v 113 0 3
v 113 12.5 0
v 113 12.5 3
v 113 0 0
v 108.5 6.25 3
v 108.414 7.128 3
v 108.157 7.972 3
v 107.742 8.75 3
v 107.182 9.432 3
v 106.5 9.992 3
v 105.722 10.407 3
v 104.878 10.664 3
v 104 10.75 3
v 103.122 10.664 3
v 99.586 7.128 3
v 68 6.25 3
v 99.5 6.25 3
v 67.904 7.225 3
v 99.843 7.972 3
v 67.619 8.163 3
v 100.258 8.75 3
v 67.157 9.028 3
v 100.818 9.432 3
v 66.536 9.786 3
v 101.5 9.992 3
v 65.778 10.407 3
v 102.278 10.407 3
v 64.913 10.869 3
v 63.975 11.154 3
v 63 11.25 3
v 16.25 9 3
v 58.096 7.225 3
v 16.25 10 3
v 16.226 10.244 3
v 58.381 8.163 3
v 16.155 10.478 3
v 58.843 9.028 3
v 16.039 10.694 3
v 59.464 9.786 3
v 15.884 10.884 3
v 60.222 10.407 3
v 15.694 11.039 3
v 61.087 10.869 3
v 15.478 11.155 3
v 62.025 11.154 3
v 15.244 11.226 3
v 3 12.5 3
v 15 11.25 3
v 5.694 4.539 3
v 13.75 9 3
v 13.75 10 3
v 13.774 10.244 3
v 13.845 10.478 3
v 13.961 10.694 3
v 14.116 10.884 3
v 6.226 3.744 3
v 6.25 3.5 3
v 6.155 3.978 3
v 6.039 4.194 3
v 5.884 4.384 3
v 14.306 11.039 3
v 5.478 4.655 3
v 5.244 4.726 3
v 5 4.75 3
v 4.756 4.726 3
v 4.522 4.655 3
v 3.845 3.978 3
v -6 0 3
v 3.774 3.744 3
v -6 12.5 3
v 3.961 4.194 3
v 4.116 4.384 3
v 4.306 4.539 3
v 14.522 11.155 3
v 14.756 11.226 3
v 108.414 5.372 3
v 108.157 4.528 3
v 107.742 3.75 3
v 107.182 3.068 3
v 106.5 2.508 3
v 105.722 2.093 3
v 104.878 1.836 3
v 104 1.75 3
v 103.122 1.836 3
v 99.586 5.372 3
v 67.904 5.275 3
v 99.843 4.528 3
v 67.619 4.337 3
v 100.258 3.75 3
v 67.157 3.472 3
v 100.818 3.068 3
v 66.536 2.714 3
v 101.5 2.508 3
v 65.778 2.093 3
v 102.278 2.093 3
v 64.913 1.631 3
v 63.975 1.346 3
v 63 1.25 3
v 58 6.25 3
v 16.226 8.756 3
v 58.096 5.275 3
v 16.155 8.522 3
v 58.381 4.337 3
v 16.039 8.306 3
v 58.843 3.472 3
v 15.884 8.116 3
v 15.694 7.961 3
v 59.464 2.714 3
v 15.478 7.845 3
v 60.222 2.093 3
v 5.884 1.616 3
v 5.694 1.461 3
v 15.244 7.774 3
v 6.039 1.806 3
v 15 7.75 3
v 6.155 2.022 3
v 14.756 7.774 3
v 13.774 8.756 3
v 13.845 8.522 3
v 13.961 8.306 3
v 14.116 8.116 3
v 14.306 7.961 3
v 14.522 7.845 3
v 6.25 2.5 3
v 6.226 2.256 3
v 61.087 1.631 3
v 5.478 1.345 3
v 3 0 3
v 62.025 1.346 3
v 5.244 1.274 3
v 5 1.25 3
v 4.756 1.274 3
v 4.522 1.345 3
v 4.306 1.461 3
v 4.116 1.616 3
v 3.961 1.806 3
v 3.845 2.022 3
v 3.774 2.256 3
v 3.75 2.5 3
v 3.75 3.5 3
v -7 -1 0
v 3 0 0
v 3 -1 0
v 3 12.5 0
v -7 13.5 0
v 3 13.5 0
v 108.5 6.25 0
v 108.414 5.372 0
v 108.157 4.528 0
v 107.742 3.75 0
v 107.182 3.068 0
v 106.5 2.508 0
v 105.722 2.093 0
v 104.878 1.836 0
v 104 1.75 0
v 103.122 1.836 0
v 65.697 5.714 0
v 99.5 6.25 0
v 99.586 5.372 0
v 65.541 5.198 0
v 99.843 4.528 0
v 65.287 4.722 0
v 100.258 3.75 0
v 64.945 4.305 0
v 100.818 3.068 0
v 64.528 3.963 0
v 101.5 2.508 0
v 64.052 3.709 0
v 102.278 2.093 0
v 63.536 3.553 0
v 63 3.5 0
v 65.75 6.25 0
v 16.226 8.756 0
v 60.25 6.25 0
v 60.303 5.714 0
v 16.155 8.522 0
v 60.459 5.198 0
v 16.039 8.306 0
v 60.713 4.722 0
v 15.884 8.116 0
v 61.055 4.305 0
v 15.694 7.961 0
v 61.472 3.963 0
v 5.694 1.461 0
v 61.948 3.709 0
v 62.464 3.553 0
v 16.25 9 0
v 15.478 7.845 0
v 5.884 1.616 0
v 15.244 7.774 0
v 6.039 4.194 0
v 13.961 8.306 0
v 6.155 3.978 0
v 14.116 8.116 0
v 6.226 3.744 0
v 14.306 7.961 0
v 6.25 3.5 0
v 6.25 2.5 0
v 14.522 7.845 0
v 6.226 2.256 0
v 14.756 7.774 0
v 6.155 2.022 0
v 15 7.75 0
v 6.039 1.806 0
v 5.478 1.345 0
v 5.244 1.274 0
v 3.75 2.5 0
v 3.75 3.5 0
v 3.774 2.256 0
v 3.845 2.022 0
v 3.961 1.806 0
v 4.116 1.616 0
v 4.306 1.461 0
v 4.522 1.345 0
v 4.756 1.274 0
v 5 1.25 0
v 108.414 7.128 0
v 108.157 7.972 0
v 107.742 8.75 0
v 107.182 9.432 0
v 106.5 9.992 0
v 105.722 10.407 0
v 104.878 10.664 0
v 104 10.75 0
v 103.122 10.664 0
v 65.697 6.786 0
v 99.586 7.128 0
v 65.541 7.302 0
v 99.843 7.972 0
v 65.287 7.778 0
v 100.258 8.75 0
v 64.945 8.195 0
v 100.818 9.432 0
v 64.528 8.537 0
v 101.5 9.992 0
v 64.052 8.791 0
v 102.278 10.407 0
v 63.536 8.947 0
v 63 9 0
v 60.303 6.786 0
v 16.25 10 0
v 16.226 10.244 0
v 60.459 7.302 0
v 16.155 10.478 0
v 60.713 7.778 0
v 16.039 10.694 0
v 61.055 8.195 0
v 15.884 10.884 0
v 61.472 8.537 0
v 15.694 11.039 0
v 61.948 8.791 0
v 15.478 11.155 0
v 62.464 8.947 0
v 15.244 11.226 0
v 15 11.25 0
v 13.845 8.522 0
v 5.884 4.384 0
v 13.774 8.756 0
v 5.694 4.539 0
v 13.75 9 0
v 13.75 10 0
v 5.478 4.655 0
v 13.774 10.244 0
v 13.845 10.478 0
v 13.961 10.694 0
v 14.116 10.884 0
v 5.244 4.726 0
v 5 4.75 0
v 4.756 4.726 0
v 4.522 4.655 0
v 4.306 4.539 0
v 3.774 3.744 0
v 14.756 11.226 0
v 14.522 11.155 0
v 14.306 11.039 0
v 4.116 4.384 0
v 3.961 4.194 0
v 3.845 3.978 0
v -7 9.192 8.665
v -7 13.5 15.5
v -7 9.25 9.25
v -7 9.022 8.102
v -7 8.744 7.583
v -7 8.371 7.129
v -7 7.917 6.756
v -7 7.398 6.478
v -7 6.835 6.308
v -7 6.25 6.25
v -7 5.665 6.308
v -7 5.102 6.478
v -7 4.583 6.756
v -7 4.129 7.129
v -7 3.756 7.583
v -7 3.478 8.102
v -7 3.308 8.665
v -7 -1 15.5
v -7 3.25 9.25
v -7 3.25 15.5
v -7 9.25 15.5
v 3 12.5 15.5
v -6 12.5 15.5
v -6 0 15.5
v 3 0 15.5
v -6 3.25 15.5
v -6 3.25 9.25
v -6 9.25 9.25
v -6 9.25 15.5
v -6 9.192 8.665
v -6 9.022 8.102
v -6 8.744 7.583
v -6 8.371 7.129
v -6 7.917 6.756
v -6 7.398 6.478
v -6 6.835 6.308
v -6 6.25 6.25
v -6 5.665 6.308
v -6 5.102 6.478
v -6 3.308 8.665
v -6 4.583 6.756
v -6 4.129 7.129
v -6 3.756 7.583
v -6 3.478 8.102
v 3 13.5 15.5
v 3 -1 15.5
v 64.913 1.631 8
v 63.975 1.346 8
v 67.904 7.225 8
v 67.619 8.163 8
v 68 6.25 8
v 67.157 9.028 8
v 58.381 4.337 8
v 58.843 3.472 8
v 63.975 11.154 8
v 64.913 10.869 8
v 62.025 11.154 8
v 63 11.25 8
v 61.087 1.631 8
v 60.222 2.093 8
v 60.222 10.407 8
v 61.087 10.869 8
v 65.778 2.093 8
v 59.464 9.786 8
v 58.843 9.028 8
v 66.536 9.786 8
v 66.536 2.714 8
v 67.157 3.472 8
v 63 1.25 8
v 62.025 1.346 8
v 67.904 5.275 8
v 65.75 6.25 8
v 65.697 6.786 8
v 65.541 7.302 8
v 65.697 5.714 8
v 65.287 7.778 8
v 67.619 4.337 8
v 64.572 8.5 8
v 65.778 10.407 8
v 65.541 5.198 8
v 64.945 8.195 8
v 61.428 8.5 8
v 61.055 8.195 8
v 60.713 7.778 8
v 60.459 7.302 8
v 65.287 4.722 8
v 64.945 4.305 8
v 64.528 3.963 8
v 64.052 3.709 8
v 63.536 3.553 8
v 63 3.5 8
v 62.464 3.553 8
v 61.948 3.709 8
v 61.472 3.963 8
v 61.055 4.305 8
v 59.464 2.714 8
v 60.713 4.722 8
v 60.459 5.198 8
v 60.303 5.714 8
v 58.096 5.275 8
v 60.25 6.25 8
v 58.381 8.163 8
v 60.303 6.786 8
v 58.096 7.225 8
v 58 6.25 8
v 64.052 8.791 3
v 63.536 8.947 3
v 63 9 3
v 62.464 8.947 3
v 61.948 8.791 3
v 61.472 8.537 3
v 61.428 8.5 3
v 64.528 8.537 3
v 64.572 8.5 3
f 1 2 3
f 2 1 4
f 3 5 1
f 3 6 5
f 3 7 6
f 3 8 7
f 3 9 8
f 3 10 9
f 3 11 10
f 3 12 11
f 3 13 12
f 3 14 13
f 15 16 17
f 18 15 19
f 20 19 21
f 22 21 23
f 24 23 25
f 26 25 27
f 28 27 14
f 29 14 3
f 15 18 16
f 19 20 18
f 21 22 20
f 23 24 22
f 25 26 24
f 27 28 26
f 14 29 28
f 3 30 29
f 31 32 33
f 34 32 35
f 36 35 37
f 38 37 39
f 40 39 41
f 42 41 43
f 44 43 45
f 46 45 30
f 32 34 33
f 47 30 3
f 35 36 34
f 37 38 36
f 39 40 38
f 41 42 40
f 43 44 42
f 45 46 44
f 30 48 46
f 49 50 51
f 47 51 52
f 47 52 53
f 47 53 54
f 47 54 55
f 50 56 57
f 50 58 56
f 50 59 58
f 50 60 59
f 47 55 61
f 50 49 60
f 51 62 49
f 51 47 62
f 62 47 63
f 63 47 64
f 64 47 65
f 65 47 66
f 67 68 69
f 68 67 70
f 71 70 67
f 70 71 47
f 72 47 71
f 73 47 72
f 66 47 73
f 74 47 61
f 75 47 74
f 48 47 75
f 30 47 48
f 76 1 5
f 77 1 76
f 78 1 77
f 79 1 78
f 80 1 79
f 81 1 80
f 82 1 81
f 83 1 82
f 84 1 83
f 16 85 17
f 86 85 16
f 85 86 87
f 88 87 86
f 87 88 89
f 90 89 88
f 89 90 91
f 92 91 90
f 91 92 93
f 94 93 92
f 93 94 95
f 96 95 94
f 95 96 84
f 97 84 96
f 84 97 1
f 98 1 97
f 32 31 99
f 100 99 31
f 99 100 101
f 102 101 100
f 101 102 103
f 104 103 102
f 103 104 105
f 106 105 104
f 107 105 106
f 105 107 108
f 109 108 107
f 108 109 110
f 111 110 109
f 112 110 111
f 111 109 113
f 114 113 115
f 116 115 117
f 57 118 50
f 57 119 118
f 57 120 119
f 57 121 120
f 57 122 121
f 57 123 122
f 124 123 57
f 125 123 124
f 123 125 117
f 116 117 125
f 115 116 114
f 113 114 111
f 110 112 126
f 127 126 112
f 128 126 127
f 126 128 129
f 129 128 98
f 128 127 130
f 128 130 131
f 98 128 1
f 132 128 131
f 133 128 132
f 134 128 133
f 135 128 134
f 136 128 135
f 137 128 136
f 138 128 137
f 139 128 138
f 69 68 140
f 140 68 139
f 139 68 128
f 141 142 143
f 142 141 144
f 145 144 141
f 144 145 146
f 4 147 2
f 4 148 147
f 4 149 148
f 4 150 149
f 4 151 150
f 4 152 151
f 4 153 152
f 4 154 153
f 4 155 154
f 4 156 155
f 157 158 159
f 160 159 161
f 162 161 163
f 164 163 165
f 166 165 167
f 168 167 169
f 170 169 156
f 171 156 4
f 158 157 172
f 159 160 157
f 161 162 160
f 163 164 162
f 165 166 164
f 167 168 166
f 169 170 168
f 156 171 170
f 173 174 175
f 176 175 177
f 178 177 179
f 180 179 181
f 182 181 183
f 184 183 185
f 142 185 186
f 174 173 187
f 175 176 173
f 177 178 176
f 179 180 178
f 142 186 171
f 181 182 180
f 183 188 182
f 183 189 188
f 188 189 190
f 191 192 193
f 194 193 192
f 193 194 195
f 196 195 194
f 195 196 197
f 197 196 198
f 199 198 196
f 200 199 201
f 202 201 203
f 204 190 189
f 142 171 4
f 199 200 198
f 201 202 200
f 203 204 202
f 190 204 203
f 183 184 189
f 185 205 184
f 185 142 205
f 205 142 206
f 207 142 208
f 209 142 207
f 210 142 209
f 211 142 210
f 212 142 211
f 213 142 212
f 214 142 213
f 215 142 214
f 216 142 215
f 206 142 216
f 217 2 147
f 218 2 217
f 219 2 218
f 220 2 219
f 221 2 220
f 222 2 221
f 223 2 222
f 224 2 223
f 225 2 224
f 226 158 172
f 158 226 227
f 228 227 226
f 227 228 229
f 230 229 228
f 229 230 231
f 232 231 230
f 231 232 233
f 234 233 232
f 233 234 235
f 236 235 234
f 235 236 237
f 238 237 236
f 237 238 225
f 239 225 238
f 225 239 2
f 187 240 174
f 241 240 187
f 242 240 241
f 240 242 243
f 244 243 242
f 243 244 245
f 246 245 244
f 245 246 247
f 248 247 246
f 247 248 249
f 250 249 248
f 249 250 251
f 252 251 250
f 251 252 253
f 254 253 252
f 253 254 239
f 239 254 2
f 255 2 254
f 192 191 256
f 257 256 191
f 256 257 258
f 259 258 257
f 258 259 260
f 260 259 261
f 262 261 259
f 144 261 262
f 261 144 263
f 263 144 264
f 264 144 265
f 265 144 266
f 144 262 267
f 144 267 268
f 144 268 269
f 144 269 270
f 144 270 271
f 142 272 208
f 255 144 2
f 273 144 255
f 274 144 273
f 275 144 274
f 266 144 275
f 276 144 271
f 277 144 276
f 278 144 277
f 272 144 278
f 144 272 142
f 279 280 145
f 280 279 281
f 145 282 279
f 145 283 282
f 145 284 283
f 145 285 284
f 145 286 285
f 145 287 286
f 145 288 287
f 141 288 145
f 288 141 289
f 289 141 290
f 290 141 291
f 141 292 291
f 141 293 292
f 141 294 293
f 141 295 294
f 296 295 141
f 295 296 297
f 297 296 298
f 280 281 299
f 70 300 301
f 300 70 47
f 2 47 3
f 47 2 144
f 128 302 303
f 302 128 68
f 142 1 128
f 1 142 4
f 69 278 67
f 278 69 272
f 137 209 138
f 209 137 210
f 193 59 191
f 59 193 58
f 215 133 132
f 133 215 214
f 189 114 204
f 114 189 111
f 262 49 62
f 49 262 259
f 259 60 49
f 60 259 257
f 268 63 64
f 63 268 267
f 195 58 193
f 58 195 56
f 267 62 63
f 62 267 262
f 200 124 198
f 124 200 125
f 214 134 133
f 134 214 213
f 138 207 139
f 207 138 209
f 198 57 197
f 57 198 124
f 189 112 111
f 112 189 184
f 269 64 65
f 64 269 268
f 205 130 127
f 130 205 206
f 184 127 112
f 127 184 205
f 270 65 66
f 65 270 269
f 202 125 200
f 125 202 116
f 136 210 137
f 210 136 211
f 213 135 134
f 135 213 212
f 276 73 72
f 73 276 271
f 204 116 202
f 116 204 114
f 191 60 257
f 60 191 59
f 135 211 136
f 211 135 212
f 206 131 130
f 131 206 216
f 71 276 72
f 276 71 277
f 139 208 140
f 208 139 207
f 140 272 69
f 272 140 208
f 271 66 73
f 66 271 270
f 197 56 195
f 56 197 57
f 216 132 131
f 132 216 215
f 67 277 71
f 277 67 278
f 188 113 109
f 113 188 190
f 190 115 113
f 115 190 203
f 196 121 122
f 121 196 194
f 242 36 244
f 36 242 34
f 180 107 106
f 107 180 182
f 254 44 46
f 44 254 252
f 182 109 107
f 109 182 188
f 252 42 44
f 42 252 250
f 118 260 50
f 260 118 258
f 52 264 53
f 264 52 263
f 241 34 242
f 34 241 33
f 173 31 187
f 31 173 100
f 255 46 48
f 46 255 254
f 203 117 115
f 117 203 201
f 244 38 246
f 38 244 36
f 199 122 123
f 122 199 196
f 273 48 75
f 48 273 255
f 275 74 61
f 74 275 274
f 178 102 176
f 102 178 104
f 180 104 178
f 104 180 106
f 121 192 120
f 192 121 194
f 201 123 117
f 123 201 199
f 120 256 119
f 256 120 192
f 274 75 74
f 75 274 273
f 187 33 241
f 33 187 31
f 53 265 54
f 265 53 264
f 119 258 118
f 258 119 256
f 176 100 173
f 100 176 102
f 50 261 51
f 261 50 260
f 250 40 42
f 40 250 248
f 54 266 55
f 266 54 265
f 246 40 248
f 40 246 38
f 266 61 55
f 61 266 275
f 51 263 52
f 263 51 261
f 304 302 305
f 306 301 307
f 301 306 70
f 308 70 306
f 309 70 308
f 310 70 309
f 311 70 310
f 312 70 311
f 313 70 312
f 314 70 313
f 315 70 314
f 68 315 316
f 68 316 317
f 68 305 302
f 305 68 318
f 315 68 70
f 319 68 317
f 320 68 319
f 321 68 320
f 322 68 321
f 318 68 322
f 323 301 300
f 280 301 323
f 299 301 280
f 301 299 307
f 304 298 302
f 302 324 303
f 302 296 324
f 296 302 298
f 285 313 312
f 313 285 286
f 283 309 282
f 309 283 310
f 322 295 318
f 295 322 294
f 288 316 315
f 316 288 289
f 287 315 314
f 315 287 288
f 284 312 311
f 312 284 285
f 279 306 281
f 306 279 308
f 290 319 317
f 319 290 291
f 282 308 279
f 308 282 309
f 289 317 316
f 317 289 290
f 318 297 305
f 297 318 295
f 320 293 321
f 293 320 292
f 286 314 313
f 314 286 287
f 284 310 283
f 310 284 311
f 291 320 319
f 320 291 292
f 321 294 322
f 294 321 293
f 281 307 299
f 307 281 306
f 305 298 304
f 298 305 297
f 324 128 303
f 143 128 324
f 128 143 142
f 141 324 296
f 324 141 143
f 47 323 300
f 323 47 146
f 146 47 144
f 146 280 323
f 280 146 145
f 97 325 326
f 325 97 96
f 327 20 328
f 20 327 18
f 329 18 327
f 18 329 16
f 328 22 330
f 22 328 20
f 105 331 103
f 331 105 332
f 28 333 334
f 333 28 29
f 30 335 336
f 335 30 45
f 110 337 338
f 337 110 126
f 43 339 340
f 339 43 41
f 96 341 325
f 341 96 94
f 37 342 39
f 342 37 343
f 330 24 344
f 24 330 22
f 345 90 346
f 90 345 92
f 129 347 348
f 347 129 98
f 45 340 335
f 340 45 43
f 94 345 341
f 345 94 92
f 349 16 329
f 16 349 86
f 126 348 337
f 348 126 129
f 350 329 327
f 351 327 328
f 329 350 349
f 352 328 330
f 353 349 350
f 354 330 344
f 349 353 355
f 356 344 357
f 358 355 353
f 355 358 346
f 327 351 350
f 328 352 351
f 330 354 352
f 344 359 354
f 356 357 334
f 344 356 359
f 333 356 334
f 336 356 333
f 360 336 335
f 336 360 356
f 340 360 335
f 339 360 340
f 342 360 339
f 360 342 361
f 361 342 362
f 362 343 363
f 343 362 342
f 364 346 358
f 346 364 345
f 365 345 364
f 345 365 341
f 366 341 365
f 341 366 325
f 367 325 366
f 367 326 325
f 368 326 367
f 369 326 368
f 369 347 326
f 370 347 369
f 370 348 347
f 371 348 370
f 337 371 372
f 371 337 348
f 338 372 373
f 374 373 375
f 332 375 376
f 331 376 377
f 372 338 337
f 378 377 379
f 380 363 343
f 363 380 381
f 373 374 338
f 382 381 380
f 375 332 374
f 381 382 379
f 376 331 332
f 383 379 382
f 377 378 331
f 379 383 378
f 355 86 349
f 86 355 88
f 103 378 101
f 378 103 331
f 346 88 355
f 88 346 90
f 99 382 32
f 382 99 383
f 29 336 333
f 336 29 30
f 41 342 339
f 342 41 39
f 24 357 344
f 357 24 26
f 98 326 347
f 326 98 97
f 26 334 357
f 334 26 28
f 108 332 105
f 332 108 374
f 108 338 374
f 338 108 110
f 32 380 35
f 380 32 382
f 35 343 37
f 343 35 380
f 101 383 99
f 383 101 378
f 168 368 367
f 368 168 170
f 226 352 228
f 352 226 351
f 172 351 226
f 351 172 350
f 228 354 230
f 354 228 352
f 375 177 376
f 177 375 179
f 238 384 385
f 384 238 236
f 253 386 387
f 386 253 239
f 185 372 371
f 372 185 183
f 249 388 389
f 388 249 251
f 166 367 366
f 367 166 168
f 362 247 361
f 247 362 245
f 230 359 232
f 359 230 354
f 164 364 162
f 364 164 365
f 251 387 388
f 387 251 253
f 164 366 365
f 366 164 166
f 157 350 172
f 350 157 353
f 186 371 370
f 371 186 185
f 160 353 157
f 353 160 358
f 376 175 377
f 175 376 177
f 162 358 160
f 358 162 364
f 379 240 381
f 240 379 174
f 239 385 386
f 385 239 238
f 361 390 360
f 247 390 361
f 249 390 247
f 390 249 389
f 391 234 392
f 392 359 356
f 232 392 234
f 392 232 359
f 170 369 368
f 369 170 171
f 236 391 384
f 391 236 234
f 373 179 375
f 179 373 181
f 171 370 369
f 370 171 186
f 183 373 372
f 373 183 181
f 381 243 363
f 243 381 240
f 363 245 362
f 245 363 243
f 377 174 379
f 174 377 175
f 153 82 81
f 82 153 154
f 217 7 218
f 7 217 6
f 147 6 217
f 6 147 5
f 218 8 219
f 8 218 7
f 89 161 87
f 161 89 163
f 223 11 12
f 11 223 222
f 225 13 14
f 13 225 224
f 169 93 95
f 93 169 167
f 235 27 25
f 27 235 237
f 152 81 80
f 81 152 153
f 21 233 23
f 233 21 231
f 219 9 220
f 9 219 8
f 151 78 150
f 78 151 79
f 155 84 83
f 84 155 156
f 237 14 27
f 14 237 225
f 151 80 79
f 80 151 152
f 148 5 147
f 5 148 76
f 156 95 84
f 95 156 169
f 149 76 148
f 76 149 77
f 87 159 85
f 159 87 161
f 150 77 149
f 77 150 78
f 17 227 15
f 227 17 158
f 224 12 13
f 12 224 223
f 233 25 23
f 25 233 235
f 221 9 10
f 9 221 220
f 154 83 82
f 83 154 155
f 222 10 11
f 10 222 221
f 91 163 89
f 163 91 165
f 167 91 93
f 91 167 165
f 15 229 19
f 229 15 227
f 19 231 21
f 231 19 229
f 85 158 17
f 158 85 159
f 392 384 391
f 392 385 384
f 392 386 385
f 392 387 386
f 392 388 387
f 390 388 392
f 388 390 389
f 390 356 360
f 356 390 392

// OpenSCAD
// arduino solenoid music
$fn = 32;

// dimensions solenoid: 20, 12.3, 12.3

servo_offset=63;

difference(){
    union(){
        difference(){
            //cube([20,12.5, 3]);
            translate([-7,0,0])
            cube([120, 12.5, 3]);
            
            hull(){
                translate([5,2.5,-1])
                cylinder(r=1.25, h=10);
                translate([5,3.5,-1])
                cylinder(r=1.25, h=10);
            }
            
            hull(){
                translate([20-5,12.5-2.5,-1])
                cylinder(r=1.25, h=10);
                translate([20-5,12.5-3.5,-1])
                cylinder(r=1.25, h=10);
            }
        }

        // anschlag
        translate([-7,0,3])
        difference(){
            cube([1, 12.5, 12.5]);
            
            translate([-1, 12.5/2, 12.5/2])
            rotate([0,90,0])
            cylinder(r=3, h=10);
            
            translate([-.5,12.5/2-3,12.5/2])
            cube([2, 6, 8]);
        }
        
        
        // seiten anschlag
        translate([-7,-1,0])
        cube([10,1,15.5]);
        
        translate([-7,12.5,0])
        cube([10,1,15.5]);
        
        // servo-kupplung
        translate([servo_offset,12.5/2,3])
        cylinder(r=5, h=5);
    }
    
    // servo-kupplung
    translate([servo_offset,12.5/2,-1])
    cylinder(r=2.75, h=20);
    
    // gegengewicht
    translate([104,12.5/2,-1])
    cylinder(r=4.5, h=20);
}

// servo-D
translate([servo_offset-2.5,12.5/2+2.25,3])
cube([5,0.5,5]);
